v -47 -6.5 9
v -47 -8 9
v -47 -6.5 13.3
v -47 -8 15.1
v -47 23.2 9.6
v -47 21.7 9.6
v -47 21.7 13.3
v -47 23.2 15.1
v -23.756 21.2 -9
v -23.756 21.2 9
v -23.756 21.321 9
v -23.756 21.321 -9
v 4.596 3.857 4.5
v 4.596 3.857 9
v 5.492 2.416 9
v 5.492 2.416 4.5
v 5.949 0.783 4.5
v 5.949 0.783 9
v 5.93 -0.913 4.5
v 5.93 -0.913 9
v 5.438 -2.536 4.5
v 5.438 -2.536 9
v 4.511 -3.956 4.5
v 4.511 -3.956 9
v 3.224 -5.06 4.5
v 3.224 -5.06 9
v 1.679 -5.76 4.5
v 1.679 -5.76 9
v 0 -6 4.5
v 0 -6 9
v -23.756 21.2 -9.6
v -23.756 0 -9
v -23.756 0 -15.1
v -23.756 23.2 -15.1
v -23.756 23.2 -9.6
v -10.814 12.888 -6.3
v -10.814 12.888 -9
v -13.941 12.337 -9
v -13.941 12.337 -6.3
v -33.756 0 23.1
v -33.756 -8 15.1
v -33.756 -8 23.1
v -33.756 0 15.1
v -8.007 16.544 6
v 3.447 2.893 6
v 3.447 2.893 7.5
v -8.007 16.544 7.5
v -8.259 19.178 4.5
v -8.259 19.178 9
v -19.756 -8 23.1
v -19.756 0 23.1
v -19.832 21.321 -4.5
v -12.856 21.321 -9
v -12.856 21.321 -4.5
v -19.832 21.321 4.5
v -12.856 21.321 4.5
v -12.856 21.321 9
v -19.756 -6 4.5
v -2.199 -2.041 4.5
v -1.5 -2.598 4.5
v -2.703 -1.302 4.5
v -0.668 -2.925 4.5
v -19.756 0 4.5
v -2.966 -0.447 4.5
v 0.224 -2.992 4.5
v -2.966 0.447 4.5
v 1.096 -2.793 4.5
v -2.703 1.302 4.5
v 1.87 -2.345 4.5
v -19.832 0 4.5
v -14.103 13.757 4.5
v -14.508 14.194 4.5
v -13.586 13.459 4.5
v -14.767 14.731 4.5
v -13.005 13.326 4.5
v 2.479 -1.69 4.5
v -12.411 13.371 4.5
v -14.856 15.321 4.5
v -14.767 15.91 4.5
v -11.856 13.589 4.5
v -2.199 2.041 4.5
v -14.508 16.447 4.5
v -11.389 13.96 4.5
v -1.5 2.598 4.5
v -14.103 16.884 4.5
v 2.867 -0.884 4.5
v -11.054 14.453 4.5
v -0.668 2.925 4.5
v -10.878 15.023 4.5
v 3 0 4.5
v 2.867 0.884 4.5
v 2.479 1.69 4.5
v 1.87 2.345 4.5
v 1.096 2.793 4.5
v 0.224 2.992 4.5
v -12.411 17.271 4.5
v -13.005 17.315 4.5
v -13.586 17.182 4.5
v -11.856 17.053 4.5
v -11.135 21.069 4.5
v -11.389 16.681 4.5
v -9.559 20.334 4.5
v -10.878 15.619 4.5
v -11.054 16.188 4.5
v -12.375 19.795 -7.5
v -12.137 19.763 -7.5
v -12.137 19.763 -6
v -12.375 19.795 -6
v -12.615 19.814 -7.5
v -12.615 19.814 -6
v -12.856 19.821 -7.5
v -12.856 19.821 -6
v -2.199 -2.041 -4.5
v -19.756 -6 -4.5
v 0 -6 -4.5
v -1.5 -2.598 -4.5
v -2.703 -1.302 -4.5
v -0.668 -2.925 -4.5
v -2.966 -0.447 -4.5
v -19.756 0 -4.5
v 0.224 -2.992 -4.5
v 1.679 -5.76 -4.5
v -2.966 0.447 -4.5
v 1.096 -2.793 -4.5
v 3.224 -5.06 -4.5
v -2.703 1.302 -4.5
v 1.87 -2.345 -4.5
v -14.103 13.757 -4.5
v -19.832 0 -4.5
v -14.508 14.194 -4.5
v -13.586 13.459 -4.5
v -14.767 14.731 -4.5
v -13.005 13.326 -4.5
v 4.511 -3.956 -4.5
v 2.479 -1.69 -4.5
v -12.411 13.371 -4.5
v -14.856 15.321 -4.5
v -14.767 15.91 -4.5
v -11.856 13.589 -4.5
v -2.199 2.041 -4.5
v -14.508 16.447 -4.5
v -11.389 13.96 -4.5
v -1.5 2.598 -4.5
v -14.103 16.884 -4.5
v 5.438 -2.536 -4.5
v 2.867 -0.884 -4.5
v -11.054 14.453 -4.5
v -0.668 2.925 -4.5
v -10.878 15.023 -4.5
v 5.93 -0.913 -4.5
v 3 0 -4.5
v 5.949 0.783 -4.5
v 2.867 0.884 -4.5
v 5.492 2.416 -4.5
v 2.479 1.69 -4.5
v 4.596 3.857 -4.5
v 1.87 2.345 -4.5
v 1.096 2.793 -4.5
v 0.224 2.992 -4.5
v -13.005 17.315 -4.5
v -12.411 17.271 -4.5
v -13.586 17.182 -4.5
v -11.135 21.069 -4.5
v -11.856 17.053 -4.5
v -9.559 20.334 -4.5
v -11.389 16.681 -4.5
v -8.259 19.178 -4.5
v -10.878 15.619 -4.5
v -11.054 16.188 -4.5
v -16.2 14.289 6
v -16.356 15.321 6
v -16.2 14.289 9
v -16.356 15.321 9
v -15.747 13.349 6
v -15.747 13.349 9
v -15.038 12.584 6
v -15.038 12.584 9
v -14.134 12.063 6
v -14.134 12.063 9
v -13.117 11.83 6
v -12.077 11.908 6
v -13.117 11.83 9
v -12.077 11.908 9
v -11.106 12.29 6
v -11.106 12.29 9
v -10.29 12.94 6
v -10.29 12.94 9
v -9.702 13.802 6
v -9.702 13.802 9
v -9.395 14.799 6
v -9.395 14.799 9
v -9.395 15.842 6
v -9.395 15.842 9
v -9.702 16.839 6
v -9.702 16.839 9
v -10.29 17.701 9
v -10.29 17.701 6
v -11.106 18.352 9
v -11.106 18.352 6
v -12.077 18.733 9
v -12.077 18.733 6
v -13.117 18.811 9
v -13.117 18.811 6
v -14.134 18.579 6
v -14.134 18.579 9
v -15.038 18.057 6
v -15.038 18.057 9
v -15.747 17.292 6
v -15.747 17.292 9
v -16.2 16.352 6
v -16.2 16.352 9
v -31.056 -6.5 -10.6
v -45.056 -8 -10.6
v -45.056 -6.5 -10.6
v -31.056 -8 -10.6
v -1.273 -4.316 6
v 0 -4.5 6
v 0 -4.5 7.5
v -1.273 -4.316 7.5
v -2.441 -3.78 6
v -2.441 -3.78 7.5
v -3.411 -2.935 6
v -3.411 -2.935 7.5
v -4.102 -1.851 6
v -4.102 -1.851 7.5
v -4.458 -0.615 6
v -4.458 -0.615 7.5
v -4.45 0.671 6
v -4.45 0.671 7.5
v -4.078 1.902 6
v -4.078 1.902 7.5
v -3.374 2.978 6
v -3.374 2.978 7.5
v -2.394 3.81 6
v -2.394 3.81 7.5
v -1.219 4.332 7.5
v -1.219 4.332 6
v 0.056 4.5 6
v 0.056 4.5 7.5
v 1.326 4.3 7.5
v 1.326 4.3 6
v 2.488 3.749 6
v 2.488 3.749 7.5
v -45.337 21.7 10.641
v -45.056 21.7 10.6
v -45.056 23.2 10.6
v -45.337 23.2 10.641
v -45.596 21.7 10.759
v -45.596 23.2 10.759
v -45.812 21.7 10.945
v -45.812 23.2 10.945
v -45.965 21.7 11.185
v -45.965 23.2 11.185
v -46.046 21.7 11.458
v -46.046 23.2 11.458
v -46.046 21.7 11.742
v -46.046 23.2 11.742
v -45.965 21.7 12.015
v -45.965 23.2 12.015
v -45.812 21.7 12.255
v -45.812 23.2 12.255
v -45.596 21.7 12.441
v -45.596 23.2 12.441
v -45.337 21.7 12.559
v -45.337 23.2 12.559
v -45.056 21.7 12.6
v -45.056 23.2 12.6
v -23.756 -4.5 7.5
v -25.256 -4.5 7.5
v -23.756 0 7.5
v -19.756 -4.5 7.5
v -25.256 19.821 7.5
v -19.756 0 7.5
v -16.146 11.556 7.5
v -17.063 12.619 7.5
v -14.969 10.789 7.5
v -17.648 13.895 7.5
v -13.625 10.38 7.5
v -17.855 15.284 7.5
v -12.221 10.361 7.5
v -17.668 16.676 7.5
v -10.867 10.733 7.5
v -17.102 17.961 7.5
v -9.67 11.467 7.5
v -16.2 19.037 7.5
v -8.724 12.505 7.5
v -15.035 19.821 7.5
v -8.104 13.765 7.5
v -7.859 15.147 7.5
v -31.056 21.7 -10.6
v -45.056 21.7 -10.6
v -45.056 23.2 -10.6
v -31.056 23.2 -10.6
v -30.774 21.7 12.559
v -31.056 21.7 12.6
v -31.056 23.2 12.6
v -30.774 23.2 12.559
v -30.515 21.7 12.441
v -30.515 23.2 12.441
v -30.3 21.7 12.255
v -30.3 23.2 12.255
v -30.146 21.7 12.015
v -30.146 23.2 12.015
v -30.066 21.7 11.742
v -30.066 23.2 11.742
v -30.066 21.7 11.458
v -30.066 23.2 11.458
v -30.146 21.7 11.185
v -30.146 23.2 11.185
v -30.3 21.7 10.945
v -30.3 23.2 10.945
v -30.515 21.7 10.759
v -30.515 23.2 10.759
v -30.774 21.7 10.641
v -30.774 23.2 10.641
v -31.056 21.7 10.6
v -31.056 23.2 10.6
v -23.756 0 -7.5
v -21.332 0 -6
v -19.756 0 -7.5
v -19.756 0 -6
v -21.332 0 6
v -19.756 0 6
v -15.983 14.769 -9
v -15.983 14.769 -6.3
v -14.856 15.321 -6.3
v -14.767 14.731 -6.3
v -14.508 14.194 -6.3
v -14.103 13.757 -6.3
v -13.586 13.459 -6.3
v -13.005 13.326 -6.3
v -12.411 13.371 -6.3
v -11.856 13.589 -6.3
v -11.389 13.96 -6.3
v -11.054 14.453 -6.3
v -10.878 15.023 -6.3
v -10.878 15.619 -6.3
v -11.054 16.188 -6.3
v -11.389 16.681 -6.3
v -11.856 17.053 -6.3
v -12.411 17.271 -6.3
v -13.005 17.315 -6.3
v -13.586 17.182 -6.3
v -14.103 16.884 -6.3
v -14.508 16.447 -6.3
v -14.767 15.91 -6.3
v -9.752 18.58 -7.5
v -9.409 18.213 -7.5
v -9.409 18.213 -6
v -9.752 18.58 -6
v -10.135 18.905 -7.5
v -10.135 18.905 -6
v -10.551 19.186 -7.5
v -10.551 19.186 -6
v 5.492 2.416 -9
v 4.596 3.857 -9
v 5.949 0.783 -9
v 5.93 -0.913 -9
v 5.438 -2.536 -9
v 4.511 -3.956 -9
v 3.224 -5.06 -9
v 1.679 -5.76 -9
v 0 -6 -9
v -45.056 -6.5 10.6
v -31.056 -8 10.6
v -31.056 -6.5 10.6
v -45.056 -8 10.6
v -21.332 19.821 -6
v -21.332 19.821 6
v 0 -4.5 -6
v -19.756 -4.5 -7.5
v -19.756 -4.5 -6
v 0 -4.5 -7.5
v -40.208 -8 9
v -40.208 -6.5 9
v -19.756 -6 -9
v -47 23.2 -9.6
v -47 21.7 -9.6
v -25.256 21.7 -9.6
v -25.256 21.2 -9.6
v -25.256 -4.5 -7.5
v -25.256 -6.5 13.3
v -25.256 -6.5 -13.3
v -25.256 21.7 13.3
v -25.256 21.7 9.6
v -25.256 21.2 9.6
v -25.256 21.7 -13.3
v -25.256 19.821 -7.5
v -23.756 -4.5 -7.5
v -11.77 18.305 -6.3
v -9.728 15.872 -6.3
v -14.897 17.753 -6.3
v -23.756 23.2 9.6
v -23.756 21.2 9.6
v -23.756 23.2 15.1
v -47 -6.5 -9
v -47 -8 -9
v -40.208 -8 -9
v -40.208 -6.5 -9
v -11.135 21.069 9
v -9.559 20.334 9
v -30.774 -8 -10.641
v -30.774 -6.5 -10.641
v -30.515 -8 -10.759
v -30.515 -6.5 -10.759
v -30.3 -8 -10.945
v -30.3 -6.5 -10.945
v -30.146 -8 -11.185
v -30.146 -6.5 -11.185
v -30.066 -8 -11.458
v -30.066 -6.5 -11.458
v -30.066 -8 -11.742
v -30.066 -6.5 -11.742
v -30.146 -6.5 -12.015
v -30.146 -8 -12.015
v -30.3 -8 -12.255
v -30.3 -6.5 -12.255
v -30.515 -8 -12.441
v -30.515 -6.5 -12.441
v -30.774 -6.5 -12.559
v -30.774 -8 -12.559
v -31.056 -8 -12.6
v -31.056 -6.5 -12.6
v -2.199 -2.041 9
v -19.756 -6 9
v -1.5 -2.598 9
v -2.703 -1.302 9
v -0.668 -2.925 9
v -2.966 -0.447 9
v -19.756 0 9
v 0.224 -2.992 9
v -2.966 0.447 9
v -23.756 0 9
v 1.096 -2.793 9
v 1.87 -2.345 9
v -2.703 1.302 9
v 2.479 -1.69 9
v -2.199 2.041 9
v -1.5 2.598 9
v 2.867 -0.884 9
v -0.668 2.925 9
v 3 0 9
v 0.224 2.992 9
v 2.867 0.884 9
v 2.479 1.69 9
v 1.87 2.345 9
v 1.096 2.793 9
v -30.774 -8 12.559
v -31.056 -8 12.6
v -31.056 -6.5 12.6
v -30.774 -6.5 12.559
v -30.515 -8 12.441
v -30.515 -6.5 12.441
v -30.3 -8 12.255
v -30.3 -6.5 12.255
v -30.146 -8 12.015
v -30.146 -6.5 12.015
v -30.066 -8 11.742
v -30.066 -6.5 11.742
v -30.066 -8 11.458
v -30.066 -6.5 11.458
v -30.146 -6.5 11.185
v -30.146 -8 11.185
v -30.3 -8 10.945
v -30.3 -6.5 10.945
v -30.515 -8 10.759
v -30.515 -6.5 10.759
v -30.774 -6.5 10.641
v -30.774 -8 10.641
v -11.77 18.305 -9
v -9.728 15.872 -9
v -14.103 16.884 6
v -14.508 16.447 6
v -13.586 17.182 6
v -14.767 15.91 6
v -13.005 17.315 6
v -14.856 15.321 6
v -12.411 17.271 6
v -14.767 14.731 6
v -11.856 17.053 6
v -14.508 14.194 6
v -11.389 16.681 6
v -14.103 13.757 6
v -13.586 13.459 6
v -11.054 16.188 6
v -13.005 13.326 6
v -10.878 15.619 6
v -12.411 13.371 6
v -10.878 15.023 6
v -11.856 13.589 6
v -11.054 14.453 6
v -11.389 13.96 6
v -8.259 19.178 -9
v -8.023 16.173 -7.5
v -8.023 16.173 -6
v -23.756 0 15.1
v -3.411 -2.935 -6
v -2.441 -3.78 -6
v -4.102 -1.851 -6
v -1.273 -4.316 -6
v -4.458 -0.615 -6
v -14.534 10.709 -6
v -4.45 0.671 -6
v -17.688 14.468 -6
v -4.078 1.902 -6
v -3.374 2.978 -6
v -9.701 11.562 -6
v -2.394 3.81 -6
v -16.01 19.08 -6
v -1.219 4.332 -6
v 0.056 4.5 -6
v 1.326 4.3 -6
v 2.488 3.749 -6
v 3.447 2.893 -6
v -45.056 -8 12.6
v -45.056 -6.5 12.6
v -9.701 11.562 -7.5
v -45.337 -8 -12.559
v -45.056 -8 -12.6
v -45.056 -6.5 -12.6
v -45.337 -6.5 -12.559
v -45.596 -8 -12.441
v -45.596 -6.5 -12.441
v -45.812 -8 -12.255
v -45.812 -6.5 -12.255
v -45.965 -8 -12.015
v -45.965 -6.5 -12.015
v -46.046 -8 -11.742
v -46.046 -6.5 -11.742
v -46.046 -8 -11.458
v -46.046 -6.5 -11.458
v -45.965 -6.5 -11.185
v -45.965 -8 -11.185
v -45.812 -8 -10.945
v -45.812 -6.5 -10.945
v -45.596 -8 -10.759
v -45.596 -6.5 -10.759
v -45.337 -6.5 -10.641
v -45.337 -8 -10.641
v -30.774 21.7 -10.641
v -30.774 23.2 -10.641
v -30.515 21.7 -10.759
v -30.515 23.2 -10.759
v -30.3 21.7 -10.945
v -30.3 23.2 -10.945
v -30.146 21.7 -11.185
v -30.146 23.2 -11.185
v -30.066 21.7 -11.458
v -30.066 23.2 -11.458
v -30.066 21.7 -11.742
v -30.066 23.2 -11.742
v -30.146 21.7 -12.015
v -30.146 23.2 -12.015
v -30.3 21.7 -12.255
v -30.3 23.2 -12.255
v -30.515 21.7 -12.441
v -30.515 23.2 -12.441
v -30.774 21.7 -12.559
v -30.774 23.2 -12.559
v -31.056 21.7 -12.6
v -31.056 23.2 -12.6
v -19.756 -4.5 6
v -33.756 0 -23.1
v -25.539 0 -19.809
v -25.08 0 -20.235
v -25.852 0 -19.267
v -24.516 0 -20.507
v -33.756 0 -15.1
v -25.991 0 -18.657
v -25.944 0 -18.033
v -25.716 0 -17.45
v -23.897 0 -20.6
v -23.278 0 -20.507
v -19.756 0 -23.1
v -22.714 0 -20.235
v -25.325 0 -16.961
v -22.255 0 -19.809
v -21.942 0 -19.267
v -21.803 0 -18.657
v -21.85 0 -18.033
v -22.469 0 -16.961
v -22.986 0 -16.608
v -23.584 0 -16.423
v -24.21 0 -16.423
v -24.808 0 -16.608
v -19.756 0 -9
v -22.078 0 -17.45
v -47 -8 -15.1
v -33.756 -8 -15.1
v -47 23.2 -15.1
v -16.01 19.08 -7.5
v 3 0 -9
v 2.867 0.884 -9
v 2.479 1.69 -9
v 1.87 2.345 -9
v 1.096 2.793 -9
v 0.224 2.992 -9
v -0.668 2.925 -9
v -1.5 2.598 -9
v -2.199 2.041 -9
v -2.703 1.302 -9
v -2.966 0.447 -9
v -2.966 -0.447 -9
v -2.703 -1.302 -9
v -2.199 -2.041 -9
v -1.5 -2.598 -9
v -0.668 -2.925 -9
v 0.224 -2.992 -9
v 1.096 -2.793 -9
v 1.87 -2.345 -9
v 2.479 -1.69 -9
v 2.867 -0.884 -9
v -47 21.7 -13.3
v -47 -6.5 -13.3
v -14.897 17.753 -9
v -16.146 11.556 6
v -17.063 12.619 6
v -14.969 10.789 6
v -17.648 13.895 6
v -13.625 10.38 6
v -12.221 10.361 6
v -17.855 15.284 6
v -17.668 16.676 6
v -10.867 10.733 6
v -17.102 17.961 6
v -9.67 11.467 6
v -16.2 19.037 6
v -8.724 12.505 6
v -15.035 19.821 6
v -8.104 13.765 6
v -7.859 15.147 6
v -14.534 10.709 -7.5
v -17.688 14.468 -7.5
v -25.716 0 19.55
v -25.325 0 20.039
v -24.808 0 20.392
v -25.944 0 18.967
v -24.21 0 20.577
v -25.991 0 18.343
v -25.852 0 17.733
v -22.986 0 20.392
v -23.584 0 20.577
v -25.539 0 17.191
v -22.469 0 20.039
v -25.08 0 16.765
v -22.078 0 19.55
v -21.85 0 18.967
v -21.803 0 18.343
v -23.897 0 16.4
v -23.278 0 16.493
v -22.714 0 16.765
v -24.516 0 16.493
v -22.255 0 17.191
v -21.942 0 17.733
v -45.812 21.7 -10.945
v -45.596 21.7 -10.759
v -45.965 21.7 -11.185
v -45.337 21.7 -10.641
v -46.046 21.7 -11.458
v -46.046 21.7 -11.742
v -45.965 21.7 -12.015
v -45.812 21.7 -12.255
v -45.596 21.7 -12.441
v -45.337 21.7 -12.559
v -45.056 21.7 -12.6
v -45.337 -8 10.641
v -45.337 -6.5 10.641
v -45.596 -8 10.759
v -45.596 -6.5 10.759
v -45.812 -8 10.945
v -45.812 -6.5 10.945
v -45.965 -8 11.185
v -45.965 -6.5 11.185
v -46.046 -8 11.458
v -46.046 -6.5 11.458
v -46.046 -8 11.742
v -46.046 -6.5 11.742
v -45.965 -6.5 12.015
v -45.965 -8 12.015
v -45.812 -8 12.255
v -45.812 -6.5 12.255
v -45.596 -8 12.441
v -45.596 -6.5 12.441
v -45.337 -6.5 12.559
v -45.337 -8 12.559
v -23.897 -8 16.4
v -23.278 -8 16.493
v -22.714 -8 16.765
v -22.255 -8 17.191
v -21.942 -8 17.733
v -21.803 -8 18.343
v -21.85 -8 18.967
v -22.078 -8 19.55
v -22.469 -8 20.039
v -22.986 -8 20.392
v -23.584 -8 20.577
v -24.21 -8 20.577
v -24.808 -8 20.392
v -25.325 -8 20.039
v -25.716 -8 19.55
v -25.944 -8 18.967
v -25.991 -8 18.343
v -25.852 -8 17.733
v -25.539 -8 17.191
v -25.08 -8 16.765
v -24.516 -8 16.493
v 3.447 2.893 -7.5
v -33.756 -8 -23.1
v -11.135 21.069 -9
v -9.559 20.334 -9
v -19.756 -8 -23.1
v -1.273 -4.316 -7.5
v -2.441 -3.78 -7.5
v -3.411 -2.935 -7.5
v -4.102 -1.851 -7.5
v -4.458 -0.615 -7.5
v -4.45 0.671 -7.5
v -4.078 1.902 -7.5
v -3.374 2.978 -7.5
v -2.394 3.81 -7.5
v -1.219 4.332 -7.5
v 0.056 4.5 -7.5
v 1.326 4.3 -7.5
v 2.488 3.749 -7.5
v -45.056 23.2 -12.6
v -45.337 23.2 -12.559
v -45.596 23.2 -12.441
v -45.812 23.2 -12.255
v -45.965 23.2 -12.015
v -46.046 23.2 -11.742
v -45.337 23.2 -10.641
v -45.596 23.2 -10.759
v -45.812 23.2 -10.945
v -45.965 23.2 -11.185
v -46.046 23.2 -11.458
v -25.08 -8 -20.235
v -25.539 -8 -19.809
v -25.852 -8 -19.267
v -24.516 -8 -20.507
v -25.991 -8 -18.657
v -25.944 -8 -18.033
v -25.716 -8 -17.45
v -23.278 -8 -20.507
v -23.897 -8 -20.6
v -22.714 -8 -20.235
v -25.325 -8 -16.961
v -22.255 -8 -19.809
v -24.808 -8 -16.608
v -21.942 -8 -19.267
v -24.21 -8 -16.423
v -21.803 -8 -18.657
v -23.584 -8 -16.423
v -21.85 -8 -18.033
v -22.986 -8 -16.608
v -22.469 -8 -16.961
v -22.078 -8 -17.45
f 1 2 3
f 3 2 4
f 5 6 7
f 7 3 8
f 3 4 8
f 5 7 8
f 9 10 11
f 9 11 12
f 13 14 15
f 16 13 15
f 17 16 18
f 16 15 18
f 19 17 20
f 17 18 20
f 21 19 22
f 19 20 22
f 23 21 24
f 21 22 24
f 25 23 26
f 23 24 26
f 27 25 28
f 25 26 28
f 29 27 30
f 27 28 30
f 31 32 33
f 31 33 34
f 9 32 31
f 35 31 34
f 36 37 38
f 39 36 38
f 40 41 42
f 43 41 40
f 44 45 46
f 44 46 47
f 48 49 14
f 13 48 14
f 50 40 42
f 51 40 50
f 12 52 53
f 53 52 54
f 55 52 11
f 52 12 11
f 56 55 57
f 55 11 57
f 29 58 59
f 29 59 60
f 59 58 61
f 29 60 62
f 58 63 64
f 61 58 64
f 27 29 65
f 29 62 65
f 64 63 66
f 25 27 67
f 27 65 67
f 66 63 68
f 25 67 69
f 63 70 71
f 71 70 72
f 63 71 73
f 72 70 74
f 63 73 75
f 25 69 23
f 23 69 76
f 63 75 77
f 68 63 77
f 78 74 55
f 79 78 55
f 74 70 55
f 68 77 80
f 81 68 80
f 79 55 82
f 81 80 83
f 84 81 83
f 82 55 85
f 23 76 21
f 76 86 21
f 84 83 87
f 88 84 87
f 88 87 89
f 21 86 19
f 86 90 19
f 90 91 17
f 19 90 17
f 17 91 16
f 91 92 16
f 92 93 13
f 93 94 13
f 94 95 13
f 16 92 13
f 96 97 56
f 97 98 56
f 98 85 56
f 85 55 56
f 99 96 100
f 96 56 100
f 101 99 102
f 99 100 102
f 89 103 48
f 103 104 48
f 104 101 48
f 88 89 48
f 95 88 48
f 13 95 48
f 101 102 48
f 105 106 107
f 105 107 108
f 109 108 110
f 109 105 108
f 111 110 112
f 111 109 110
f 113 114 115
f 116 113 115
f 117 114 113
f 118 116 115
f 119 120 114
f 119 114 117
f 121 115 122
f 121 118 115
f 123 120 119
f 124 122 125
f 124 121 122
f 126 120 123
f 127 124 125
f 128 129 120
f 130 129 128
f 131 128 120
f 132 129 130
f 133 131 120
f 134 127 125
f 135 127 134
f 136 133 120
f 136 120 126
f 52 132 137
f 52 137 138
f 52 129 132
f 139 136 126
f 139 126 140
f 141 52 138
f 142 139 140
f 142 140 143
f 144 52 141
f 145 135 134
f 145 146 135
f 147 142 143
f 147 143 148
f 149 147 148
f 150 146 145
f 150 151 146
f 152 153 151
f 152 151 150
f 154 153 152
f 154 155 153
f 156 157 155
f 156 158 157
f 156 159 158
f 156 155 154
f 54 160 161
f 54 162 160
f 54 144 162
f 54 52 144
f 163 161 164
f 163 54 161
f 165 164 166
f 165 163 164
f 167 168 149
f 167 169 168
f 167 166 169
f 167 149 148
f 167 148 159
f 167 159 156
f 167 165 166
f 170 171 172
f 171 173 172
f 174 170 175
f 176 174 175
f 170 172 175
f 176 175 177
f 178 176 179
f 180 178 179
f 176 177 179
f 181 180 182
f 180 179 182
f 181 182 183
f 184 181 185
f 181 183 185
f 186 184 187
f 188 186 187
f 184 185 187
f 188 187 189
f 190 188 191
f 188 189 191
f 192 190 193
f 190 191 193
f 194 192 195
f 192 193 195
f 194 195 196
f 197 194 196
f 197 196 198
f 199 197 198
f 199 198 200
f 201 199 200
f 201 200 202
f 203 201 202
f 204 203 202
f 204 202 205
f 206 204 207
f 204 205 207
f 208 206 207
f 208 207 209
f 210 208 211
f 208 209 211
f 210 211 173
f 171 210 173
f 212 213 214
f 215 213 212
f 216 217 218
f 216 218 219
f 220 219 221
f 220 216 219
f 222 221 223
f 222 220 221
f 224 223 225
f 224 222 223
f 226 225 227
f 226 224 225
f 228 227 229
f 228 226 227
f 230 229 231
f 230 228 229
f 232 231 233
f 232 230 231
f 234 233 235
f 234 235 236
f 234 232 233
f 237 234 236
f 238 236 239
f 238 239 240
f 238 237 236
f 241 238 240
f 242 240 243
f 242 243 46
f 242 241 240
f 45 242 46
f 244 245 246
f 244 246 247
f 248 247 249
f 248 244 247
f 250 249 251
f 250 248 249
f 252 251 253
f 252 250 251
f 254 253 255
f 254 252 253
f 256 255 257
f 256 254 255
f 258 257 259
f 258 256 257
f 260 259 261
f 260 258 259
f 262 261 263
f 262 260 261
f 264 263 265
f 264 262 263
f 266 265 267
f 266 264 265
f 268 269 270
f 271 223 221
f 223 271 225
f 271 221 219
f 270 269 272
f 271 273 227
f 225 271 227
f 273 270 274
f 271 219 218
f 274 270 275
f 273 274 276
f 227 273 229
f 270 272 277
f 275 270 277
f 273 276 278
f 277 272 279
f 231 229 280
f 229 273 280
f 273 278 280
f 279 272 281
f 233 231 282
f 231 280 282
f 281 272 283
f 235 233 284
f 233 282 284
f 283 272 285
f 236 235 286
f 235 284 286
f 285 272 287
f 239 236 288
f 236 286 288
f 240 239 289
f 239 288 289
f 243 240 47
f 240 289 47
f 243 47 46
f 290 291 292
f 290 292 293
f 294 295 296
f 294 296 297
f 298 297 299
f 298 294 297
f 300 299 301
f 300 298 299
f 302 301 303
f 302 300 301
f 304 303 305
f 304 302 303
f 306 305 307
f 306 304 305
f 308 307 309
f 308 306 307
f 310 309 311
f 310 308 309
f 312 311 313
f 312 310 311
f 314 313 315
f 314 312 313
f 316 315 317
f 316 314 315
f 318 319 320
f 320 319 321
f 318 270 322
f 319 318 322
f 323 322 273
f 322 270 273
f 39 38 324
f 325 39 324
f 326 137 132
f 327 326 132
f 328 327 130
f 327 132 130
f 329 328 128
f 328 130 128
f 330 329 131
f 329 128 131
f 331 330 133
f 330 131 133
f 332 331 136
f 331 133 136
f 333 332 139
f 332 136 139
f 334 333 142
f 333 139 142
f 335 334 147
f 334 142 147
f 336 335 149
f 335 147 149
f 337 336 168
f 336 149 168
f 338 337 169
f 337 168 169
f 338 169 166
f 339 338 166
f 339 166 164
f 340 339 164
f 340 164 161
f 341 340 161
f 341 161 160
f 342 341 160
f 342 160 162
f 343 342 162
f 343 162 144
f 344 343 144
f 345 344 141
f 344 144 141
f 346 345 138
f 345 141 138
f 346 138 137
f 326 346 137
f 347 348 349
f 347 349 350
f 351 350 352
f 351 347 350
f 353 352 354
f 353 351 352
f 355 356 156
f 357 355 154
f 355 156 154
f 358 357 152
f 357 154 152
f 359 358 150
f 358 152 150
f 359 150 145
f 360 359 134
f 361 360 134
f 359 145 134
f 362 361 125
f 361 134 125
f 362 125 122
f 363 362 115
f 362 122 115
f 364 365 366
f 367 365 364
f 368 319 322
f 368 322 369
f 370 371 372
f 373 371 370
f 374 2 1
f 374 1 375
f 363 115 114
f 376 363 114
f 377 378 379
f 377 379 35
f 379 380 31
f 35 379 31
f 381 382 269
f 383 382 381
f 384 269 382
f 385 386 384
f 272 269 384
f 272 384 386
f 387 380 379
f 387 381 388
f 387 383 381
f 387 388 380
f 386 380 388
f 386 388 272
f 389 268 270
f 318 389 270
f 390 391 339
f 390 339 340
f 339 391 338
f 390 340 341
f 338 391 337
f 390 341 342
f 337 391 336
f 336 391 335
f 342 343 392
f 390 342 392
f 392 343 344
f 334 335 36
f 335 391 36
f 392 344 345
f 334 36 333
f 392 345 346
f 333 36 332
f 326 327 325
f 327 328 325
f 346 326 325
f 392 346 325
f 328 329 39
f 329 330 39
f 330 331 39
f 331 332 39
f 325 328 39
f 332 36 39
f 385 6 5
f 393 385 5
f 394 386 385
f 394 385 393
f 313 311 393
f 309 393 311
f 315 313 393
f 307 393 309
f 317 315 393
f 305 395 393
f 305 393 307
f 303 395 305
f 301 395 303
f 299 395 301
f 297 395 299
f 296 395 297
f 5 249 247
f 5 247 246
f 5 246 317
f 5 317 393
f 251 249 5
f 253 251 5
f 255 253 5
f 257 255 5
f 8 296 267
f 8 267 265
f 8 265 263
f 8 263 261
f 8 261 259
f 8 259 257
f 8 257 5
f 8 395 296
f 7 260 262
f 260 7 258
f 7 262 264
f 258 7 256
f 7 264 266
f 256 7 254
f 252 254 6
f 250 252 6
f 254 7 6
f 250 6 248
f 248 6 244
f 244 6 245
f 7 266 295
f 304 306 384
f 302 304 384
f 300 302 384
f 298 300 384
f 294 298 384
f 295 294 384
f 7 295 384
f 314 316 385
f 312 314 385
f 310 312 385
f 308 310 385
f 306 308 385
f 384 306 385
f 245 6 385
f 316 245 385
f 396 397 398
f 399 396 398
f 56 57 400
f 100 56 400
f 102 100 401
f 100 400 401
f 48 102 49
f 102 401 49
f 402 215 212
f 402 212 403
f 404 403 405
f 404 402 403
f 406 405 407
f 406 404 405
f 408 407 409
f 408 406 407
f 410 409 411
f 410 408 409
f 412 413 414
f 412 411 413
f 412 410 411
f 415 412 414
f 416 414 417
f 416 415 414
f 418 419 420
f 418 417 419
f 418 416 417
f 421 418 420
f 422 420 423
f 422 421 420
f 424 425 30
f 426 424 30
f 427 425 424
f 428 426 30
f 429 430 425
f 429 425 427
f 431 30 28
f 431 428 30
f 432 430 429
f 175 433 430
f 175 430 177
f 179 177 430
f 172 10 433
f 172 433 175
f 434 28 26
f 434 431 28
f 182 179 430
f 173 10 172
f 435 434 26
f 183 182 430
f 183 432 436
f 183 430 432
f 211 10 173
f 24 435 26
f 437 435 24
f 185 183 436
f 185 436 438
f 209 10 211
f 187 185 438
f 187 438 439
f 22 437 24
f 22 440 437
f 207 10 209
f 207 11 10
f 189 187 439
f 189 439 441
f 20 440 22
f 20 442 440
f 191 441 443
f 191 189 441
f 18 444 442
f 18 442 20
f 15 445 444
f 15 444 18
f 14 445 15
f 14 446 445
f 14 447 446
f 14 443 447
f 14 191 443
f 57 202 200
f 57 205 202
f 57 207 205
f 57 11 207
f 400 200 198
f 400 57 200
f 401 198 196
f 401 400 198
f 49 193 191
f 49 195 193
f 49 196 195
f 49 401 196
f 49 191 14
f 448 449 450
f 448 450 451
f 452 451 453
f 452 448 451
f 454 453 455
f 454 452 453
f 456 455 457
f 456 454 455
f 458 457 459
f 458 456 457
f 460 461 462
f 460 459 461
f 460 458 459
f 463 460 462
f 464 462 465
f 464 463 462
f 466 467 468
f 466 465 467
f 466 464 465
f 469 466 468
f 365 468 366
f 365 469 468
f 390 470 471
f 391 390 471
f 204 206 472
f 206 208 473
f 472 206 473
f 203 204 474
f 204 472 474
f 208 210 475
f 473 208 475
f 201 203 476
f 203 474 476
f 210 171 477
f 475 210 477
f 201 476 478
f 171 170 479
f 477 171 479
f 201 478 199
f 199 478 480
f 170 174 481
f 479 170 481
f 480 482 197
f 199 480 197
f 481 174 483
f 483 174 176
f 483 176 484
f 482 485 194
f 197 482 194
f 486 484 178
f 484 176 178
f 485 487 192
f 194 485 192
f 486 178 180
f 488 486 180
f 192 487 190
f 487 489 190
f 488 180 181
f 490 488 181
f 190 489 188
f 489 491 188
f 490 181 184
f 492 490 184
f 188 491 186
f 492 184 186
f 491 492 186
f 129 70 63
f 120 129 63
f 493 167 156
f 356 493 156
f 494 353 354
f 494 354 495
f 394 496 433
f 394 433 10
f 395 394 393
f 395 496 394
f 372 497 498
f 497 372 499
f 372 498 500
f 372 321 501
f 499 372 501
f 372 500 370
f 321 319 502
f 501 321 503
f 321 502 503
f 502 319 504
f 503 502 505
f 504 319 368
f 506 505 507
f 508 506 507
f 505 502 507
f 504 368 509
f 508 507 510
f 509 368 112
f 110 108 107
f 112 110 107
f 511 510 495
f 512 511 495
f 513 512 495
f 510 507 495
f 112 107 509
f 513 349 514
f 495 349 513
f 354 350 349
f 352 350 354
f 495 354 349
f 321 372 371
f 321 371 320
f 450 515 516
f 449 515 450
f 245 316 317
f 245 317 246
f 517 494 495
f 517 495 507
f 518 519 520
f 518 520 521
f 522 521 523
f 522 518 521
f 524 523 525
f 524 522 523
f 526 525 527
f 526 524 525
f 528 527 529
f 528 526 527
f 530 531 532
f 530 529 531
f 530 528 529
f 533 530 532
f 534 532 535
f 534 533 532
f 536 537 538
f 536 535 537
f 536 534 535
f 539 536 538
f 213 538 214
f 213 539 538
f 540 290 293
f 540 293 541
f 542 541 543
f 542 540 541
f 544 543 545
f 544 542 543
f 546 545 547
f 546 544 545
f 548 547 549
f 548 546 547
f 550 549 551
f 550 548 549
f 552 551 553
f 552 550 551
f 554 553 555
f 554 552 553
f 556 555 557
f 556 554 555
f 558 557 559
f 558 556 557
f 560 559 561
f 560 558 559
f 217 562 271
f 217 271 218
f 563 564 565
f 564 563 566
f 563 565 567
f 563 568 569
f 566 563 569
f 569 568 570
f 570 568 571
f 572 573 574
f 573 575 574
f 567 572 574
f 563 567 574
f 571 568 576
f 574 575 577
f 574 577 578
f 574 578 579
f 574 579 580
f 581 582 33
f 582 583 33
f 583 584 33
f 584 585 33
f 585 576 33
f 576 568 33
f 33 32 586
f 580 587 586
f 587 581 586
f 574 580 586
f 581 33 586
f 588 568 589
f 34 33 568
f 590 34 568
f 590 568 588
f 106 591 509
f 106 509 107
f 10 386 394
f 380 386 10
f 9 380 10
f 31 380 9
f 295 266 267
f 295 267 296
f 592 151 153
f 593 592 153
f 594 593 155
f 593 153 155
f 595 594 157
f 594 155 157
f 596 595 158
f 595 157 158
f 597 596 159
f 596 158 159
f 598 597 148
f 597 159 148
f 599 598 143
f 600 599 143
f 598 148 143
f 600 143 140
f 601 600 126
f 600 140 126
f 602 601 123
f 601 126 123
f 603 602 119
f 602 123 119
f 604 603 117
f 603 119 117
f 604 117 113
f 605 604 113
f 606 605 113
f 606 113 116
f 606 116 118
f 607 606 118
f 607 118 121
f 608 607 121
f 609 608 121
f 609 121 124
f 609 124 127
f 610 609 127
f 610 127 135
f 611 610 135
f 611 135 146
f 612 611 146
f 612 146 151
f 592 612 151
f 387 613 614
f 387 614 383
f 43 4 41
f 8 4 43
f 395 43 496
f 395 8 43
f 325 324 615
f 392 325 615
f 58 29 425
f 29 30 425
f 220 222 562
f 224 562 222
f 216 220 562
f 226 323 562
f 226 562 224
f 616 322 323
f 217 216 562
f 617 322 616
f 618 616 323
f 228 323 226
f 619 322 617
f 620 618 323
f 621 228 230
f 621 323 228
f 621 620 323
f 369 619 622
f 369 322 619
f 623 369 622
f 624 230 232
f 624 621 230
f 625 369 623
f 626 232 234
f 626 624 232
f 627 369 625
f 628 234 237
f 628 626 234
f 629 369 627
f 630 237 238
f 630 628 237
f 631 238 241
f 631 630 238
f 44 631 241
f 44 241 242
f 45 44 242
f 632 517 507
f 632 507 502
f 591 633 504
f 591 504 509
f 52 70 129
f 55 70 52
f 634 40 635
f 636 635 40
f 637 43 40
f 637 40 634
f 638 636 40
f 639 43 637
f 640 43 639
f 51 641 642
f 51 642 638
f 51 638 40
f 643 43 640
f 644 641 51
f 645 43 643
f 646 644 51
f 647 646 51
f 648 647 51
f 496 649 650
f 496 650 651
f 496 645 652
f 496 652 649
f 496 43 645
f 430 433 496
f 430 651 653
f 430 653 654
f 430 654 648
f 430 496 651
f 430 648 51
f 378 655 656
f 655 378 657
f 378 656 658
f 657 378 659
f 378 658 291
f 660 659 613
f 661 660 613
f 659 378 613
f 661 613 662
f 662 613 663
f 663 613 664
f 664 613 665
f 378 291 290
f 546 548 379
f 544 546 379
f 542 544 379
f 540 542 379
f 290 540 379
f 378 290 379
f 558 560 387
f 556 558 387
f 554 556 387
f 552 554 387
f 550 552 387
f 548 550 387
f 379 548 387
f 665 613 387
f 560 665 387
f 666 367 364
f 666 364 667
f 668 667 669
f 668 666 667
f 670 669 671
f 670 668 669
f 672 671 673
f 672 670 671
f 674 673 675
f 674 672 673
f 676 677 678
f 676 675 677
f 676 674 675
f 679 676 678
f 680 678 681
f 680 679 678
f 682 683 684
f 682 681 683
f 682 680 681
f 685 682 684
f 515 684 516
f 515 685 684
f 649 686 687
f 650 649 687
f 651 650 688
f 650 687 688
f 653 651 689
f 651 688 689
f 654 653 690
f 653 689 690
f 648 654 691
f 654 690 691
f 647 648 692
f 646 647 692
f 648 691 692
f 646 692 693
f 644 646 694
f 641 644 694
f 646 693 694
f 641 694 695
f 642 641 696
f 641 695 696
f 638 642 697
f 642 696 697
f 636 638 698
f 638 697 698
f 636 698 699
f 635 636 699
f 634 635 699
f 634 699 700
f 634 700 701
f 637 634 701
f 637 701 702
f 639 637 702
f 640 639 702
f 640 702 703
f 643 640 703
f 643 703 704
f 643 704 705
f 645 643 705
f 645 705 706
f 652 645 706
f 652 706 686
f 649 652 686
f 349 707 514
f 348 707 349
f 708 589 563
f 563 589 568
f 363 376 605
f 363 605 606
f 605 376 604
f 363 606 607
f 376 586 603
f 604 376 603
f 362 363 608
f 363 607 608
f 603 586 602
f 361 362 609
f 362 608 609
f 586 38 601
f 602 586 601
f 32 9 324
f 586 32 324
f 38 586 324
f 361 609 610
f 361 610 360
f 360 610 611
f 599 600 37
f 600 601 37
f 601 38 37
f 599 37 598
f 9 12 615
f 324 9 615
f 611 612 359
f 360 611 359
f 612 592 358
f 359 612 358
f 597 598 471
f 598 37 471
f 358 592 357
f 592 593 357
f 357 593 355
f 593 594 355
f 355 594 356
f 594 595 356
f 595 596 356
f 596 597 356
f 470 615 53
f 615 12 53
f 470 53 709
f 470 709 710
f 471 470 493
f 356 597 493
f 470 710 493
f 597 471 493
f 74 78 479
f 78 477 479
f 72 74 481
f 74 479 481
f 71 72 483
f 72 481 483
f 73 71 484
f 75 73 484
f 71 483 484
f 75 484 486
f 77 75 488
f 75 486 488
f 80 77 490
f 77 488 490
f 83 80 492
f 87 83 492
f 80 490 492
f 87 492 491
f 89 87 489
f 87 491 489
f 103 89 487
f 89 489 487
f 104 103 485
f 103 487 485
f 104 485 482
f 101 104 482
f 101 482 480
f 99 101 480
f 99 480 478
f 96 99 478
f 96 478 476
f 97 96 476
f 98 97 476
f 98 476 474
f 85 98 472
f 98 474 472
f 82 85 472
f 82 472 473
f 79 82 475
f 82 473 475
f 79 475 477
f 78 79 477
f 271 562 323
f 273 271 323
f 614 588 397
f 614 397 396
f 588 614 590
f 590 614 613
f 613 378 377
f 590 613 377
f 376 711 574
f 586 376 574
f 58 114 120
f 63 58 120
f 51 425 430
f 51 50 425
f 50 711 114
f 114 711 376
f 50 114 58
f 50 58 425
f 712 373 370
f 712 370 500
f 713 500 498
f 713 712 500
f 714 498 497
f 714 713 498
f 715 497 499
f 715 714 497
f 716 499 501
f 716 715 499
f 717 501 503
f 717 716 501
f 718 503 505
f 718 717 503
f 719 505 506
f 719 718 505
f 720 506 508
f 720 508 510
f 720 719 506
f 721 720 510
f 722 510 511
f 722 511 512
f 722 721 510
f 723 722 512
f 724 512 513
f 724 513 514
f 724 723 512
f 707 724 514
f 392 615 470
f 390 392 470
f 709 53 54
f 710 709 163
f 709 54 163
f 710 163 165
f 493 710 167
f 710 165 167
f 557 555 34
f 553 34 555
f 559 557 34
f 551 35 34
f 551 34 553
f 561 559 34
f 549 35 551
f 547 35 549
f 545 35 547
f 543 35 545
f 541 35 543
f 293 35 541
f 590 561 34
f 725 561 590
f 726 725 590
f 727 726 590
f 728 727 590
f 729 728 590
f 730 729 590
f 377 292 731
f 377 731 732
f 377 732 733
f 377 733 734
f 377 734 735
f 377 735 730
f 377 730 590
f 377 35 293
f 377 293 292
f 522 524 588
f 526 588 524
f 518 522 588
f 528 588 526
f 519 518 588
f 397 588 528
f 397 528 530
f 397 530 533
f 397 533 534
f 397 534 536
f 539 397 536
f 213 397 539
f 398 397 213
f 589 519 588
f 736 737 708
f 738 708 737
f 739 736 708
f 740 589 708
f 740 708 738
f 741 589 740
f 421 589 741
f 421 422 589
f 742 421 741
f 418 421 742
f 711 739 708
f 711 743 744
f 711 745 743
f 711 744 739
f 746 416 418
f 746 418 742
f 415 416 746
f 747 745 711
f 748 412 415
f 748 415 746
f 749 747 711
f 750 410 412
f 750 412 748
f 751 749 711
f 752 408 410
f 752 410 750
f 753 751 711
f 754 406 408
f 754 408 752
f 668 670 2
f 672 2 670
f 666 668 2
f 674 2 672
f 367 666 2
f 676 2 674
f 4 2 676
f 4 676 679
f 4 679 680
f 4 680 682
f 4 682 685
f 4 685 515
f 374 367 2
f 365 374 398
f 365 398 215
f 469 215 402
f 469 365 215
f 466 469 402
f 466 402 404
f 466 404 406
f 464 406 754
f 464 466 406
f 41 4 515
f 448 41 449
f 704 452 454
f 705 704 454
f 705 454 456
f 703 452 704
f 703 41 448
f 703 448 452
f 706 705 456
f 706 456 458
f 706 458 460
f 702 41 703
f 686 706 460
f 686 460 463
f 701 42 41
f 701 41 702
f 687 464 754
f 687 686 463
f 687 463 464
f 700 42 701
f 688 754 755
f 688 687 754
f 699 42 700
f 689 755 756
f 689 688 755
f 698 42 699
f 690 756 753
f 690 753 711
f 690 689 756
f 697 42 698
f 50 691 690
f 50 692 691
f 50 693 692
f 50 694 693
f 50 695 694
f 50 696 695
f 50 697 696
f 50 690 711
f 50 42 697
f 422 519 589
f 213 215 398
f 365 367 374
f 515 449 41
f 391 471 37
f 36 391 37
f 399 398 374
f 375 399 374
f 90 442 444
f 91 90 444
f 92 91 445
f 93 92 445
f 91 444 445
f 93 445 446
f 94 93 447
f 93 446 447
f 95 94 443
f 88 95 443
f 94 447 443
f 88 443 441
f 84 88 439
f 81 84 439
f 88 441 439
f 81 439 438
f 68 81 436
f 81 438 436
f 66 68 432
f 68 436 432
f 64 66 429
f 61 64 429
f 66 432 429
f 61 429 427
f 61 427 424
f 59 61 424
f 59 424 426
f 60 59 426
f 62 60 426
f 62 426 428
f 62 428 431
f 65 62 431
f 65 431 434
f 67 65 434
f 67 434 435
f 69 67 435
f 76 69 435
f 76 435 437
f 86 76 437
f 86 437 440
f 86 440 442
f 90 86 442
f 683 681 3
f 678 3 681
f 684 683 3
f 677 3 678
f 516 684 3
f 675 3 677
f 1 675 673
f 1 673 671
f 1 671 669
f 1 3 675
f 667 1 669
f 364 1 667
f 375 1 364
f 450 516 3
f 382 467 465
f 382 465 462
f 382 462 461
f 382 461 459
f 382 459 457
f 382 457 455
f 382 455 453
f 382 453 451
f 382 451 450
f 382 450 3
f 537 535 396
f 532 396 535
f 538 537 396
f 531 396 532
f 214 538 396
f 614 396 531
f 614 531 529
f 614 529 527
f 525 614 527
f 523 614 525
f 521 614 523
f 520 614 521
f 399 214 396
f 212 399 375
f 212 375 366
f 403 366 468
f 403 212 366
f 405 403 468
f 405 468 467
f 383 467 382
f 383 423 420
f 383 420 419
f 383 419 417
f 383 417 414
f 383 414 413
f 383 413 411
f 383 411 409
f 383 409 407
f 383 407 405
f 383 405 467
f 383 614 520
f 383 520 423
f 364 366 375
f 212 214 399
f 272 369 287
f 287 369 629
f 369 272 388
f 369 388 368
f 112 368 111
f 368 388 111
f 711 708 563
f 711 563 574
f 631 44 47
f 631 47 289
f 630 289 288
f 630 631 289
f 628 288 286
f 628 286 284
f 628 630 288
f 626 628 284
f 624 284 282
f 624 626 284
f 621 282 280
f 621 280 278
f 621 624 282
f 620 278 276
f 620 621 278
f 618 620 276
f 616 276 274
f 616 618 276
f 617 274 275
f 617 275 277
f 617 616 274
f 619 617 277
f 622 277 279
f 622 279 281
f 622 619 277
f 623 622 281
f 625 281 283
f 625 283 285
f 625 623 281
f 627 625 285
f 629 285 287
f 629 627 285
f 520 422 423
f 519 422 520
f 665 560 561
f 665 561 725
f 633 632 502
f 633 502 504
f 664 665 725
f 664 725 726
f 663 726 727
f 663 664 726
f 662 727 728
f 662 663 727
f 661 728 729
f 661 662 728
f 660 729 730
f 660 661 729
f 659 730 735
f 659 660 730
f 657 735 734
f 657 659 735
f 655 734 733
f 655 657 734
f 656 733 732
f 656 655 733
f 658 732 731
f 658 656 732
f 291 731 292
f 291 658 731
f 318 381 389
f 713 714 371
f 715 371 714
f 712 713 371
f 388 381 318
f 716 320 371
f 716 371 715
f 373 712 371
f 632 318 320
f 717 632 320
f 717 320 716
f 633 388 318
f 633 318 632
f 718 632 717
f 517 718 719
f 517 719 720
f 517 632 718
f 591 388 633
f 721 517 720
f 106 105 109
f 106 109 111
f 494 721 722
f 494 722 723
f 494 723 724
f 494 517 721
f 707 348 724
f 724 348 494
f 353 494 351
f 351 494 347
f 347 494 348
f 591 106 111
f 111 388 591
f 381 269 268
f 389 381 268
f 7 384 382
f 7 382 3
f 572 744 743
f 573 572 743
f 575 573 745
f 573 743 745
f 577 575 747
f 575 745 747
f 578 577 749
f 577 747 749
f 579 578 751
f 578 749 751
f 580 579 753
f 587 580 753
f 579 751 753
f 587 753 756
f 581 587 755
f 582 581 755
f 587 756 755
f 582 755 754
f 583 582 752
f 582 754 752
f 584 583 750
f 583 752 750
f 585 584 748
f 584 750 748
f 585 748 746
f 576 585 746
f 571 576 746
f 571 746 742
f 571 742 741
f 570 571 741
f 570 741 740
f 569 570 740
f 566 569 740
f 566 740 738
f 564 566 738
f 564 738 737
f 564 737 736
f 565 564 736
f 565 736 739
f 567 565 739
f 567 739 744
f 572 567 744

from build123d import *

# Parameters (mm, degrees)
EXTRUDE_1_DEPTH             = 9
SKETCH_2_W                  = 27.565905012
SKETCH_2_H                  = 27.320888862
CUT_EXTRUDE_1_DEPTH         = 4.5
CUT_EXTRUDE_2_DEPTH         = 2.7
SKETCH_5_R                  = 3
CUT_EXTRUDE_3_DEPTH         = 55.658762352
SKETCH_8_W                  = 23.244247806
SKETCH_8_H                  = 18
EXTRUDE_2_DEPTH             = 1.879111138
SKETCH_9_W                  = 23.244247806
SKETCH_9_H                  = 18
EXTRUDE_3_DEPTH             = 2
SKETCH_10_W                 = 23.244247806
SKETCH_10_H                 = 31.2
EXTRUDE_4_DEPTH             = 6.1
SKETCH_11_W                 = 23.244247806
SKETCH_11_H                 = 31.2
EXTRUDE_5_DEPTH             = 6.1
SHELL_START                 = -13.6
SHELL_2_OUTLINE_W           = 21.744247806
SHELL_2_OUTLINE_H           = 28.2
SHELL_2_DEPTH               = 27.2
SHELL_START_2               = -7.5
SHELL_2_2_OUTLINE_W         = 3.923676383
SHELL_2_2_OUTLINE_H         = 24.320888862
SHELL_2_2_DEPTH             = 15
SHELL_2_3_DEPTH             = 1.5
SHELL_START_3               = 6
SHELL_2_4_DEPTH             = 1.5
CUT_EXTRUDE_4_DEPTH         = 59.399058212
CUT_EXTRUDE_START           = -2
SKETCH_13_W                 = 23.244247806
SKETCH_13_H                 = 19.2
CUT_EXTRUDE_5_DEPTH         = 2
SKETCH_15_W                 = 10
SKETCH_15_H                 = 8
EXTRUDE_6_DEPTH             = 8
EXTRUDE_7_REACH             = 59.279
SKETCH_19_W                 = 4
SKETCH_19_H                 = 8
EXTRUDE_7_DIRECTION_2_REACH = 59.279
SKETCH_17_R                 = 2.1
CUT_EXTRUDE_6_DEPTH         = 61.959412727
SKETCH_20_W                 = 21.744247806
SKETCH_20_H                 = 28.2
EXTRUDE_8_DEPTH             = 0.3
SKETCH_21_W                 = 21.744247806
SKETCH_21_H                 = 28.2
EXTRUDE_9_DEPTH             = 0.3
CUT_EXTRUDE_7_REACH         = 62.959
SKETCH_22_W                 = 6.791501739
SKETCH_22_H                 = 18


# Read off the part's stored shape, not the designer's step: 抽壳2
with BuildPart() as part:
    # 草图1 → 凸台-拉伸1 (new, symmetric)
    with BuildSketch(Plane.XY):
        with BuildLine():
            Line((-8.259485535, 19.17761452), (4.596266659, 3.856725658))
            ThreePointArc((4.596266659, 3.856725658), (5.437846722, -2.53570957), (0, -6))
            Line((0, -6), (-47, -6))
            Line((-47, -6), (-47, 21.320888862))
            Line((-47, 21.320888862), (-12.855752194, 21.320888862))
            ThreePointArc((-12.855752194, 21.320888862), (-10.320042623, 20.758735585), (-8.259485535, 19.17761452))
        make_face()
    extrude(amount=EXTRUDE_1_DEPTH, both=True)

    # 草图2 → 切除-拉伸1 (cut, symmetric)
    with BuildSketch(Plane.XY):
        with Locations((-6.049123305, 7.660444431)):
            Rectangle(SKETCH_2_W, SKETCH_2_H)
    extrude(amount=CUT_EXTRUDE_1_DEPTH, both=True, mode=Mode.SUBTRACT)

    # 草图3 → 切除-旋转1 (revolve, cut)
    with BuildSketch(Plane(origin=(0, 0, 0), x_dir=(-0.642787609686538, 0.7660444431189792, 0), z_dir=(0.7660444431189791, 0.6427876096865379, 0)), mode=Mode.PRIVATE) as cut_revolve_1_sk:
        Polygon((19.999690983, -9), (17.499690983, -9), (17.499690983, -6.3), (17.999690983, -6.3), (17.999690983, 6), (16.499690983, 6), (16.499690983, 9), (19.999690983, 9), align=None)
    revolve(cut_revolve_1_sk.sketch.rotate(Axis((-12.855553561, 15.320652142, -10), (0, 0, 1)), 230), axis=Axis((-12.855553561, 15.320652142, -10), (0, 0, 1)), mode=Mode.SUBTRACT)

    # 草图4 → 切除-拉伸2 (cut)
    with BuildSketch(Plane(origin=(0, 0, -9), x_dir=(-1, 0, 0), z_dir=(0, 0, -1))):
        Polygon((11.76974521, 18.304668488), (9.728415424, 15.872322699), (10.814223775, 12.888306353), (13.941361912, 12.336635795), (15.982691699, 14.768981584), (14.896883348, 17.752997931), align=None)
    extrude(amount=-CUT_EXTRUDE_2_DEPTH, mode=Mode.SUBTRACT)

    # 草图5 → 切除-拉伸3 (cut, through all)
    with BuildSketch(Plane.XY.offset(9)):
        Circle(SKETCH_5_R)
    extrude(amount=-CUT_EXTRUDE_3_DEPTH, mode=Mode.SUBTRACT)

    # 草图8 → 凸台-拉伸2 (add)
    with BuildSketch(Plane(origin=(0, 21.320888862, 0), x_dir=(1, 0, 0), z_dir=(0, 1, 0))):
        with Locations((-35.377876097, 0)):
            Rectangle(SKETCH_8_W, SKETCH_8_H)
    extrude(amount=EXTRUDE_2_DEPTH)

    # 草图9 → 凸台-拉伸3 (add)
    with BuildSketch(Plane.XZ.offset(6)):
        with Locations((-35.377876097, 0)):
            Rectangle(SKETCH_9_W, SKETCH_9_H)
    extrude(amount=EXTRUDE_3_DEPTH)

    # 草图10 → 凸台-拉伸4 (add)
    with BuildSketch(Plane.XY.offset(9)):
        with Locations((-35.377876097, 7.6)):
            Rectangle(SKETCH_10_W, SKETCH_10_H)
    extrude(amount=EXTRUDE_4_DEPTH)

    # 草图11 → 凸台-拉伸5 (add)
    with BuildSketch(Plane(origin=(0, 0, -9), x_dir=(-1, 0, 0), z_dir=(0, 0, -1))):
        with Locations((35.377876097, 7.6)):
            Rectangle(SKETCH_11_W, SKETCH_11_H)
    extrude(amount=EXTRUDE_5_DEPTH)

    # 抽壳2 outline → 抽壳2 (cut)
    with BuildSketch(Plane.XY.offset(SHELL_START)):
        with Locations((-36.127876097, 7.6)):
            Rectangle(SHELL_2_OUTLINE_W, SHELL_2_OUTLINE_H)
    extrude(amount=SHELL_2_DEPTH, mode=Mode.SUBTRACT)

    # Shell 2 2 outline → Shell 2 2 (cut)
    with BuildSketch(Plane.XY.offset(SHELL_START_2)):
        with Locations((-23.293914003, 7.660444431)):
            Rectangle(SHELL_2_2_OUTLINE_W, SHELL_2_2_OUTLINE_H)
    extrude(amount=SHELL_2_2_DEPTH, mode=Mode.SUBTRACT)

    # Shell 2 3 outline → Shell 2 3 (cut)
    with BuildSketch(Plane.XY.offset(SHELL_START_2)):
        with BuildLine():
            Line((-9.700771165, 11.561572286), (-14.533621013, 10.708990515))
            Line((-14.533621013, 10.708990515), (-17.68840341, 14.46807037))
            Line((-17.68840341, 14.46807037), (-16.010335958, 19.079731997))
            Line((-16.010335958, 19.079731997), (-12.136777385, 19.763081477))
            ThreePointArc((-12.136777385, 19.763081477), (-12.495104697, 19.806413735), (-12.855752194, 19.820888862))
            Line((-12.855752194, 19.820888862), (-21.332075811, 19.820888862))
            Line((-21.332075811, 19.820888862), (-21.332075811, -4.5))
            Line((-21.332075811, -4.5), (0, -4.5))
            ThreePointArc((0, -4.5), (-4.078385042, 1.901782178), (3.447199994, 2.892544244))
            Line((3.447199994, 2.892544244), (-9.4085522, 18.213433106))
            ThreePointArc((-9.4085522, 18.213433106), (-9.939002288, 18.747632212), (-10.551084785, 19.18592549))
            Line((-10.551084785, 19.18592549), (-8.022703713, 16.173233913))
            Line((-8.022703713, 16.173233913), (-9.700771165, 11.561572286))
        make_face()
    extrude(amount=SHELL_2_3_DEPTH, mode=Mode.SUBTRACT)

    # Shell 2 4 outline → Shell 2 4 (cut)
    with BuildSketch(Plane.XY.offset(SHELL_START_3)):
        with BuildLine():
            Line((3.447199994, 2.892544244), (-8.007430451, 16.543641228))
            ThreePointArc((-8.007430451, 16.543641228), (-14.968890991, 10.789227983), (-15.034514198, 19.820888862))
            Line((-15.034514198, 19.820888862), (-21.332075811, 19.820888862))
            Line((-21.332075811, 19.820888862), (-21.332075811, -4.5))
            Line((-21.332075811, -4.5), (0, -4.5))
            ThreePointArc((0, -4.5), (-4.078385042, 1.901782178), (3.447199994, 2.892544244))
        make_face()
    extrude(amount=SHELL_2_4_DEPTH, mode=Mode.SUBTRACT)

    # 草图12 → 切除-拉伸4 (cut, through all)
    with BuildSketch(Plane.XZ.offset(8)):
        with BuildLine():
            Line((-45.055752194, 12.6), (-31.055752194, 12.6))
            ThreePointArc((-31.055752194, 12.6), (-30.055752194, 11.6), (-31.055752194, 10.6))
            Line((-31.055752194, 10.6), (-45.055752194, 10.6))
            ThreePointArc((-45.055752194, 10.6), (-46.055752194, 11.6), (-45.055752194, 12.6))
        make_face()
        with BuildLine():
            Line((-45.055752194, -10.6), (-31.055752194, -10.6))
            ThreePointArc((-31.055752194, -10.6), (-30.055752194, -11.6), (-31.055752194, -12.6))
            Line((-31.055752194, -12.6), (-45.055752194, -12.6))
            ThreePointArc((-45.055752194, -12.6), (-46.055752194, -11.6), (-45.055752194, -10.6))
        make_face()
    extrude(amount=-CUT_EXTRUDE_4_DEPTH, mode=Mode.SUBTRACT)

    # 草图13 → 切除-拉伸5 (cut)
    with BuildSketch(Plane(origin=(0, 23.2, 0), x_dir=(1, 0, 0), z_dir=(0, 1, 0)).offset(CUT_EXTRUDE_START)):
        with Locations((-35.377876097, 0)):
            Rectangle(SKETCH_13_W, SKETCH_13_H)
    extrude(amount=CUT_EXTRUDE_5_DEPTH, mode=Mode.SUBTRACT)

    # 草图15 → 凸台-拉伸6 (add)
    with BuildSketch(Plane.XY.offset(15.1)):
        with Locations((-28.755752194, -4)):
            Rectangle(SKETCH_15_W, SKETCH_15_H)
    extrude_6 = extrude(amount=EXTRUDE_6_DEPTH)

    # 镜向1: 凸台-拉伸6 across plane
    add(extrude_6.mirror(Plane.XY))

    # 凸台-拉伸7: up to this face of the body (flat: up to its plane)
    extrude_7_end = Plane(part.part.faces().sort_by_distance((-28.755752194, -4, 23.1))[0])
    # 草图19 → 凸台-拉伸7 (add, up to the picked face)
    with BuildSketch(Plane.XY, mode=Mode.PRIVATE) as extrude_7_sk1:
        with Locations((-21.755752194, -4)):
            Rectangle(SKETCH_19_W, SKETCH_19_H)
    extrude_7_tool1 = split(extrude(extrude_7_sk1.sketch, amount=EXTRUDE_7_REACH, mode=Mode.PRIVATE), bisect_by=extrude_7_end, keep=Keep.BOTH, mode=Mode.PRIVATE)
    add(extrude_7_tool1.solids().sort_by(Axis((-21.755752, -4, 0), (0, 0, 1)))[0])

    # 凸台-拉伸7 direction 2: up to this face of the body (flat: up to its plane)
    extrude_7_direction_2_end = Plane(part.part.faces().sort_by_distance((-28.755752194, -4, -23.1))[0])
    # 草图19 → 凸台-拉伸7 direction 2 (add, up to the picked face)
    with BuildSketch(Plane.XY, mode=Mode.PRIVATE) as extrude_7_direction_2_sk1:
        with Locations((-21.755752194, -4)):
            Rectangle(SKETCH_19_W, SKETCH_19_H)
    extrude_7_direction_2_tool1 = split(extrude(extrude_7_direction_2_sk1.sketch, amount=-EXTRUDE_7_DIRECTION_2_REACH, mode=Mode.PRIVATE), bisect_by=extrude_7_direction_2_end, keep=Keep.BOTH, mode=Mode.PRIVATE)
    add(extrude_7_direction_2_tool1.solids().sort_by(Axis((-21.755752, -4, 0), (0, 0, -1)))[0])

    # 草图17 → 切除-拉伸6 (cut, through all)
    with BuildSketch(Plane.XZ.offset(8)):
        with Locations(Location((-23.897040888, 18.5, 0), (0, 0, 270))):
            Circle(SKETCH_17_R)
        with Locations(Location((-23.897040888, -18.5, 0), (0, 0, 270))):
            Circle(SKETCH_17_R)
    extrude(amount=-CUT_EXTRUDE_6_DEPTH, mode=Mode.SUBTRACT)

    # 草图20 → 凸台-拉伸8 (add)
    with BuildSketch(Plane.XY.offset(-13.6)):
        with Locations((-36.127876097, 7.6)):
            Rectangle(SKETCH_20_W, SKETCH_20_H)
    extrude(amount=EXTRUDE_8_DEPTH)

    # 草图21 → 凸台-拉伸9 (add)
    with BuildSketch(Plane(origin=(0, 0, 13.6), x_dir=(-1, 0, 0), z_dir=(0, 0, -1))):
        with Locations((36.127876097, 7.6)):
            Rectangle(SKETCH_21_W, SKETCH_21_H)
    extrude(amount=EXTRUDE_9_DEPTH)

    # 草图22 → 切除-拉伸7 (cut, up to next)
    with BuildSketch(Plane.XZ.offset(8), mode=Mode.PRIVATE) as cut_extrude_7_sk1:
        with Locations((-43.604249131, 0)):
            Rectangle(SKETCH_22_W, SKETCH_22_H)
    cut_extrude_7_tool1 = extrude(cut_extrude_7_sk1.sketch, amount=-CUT_EXTRUDE_7_REACH, mode=Mode.PRIVATE) & part.part
    add(cut_extrude_7_tool1.solids().sort_by_distance((-43.604249, -8, 0))[0], mode=Mode.SUBTRACT)


solid = part.part
